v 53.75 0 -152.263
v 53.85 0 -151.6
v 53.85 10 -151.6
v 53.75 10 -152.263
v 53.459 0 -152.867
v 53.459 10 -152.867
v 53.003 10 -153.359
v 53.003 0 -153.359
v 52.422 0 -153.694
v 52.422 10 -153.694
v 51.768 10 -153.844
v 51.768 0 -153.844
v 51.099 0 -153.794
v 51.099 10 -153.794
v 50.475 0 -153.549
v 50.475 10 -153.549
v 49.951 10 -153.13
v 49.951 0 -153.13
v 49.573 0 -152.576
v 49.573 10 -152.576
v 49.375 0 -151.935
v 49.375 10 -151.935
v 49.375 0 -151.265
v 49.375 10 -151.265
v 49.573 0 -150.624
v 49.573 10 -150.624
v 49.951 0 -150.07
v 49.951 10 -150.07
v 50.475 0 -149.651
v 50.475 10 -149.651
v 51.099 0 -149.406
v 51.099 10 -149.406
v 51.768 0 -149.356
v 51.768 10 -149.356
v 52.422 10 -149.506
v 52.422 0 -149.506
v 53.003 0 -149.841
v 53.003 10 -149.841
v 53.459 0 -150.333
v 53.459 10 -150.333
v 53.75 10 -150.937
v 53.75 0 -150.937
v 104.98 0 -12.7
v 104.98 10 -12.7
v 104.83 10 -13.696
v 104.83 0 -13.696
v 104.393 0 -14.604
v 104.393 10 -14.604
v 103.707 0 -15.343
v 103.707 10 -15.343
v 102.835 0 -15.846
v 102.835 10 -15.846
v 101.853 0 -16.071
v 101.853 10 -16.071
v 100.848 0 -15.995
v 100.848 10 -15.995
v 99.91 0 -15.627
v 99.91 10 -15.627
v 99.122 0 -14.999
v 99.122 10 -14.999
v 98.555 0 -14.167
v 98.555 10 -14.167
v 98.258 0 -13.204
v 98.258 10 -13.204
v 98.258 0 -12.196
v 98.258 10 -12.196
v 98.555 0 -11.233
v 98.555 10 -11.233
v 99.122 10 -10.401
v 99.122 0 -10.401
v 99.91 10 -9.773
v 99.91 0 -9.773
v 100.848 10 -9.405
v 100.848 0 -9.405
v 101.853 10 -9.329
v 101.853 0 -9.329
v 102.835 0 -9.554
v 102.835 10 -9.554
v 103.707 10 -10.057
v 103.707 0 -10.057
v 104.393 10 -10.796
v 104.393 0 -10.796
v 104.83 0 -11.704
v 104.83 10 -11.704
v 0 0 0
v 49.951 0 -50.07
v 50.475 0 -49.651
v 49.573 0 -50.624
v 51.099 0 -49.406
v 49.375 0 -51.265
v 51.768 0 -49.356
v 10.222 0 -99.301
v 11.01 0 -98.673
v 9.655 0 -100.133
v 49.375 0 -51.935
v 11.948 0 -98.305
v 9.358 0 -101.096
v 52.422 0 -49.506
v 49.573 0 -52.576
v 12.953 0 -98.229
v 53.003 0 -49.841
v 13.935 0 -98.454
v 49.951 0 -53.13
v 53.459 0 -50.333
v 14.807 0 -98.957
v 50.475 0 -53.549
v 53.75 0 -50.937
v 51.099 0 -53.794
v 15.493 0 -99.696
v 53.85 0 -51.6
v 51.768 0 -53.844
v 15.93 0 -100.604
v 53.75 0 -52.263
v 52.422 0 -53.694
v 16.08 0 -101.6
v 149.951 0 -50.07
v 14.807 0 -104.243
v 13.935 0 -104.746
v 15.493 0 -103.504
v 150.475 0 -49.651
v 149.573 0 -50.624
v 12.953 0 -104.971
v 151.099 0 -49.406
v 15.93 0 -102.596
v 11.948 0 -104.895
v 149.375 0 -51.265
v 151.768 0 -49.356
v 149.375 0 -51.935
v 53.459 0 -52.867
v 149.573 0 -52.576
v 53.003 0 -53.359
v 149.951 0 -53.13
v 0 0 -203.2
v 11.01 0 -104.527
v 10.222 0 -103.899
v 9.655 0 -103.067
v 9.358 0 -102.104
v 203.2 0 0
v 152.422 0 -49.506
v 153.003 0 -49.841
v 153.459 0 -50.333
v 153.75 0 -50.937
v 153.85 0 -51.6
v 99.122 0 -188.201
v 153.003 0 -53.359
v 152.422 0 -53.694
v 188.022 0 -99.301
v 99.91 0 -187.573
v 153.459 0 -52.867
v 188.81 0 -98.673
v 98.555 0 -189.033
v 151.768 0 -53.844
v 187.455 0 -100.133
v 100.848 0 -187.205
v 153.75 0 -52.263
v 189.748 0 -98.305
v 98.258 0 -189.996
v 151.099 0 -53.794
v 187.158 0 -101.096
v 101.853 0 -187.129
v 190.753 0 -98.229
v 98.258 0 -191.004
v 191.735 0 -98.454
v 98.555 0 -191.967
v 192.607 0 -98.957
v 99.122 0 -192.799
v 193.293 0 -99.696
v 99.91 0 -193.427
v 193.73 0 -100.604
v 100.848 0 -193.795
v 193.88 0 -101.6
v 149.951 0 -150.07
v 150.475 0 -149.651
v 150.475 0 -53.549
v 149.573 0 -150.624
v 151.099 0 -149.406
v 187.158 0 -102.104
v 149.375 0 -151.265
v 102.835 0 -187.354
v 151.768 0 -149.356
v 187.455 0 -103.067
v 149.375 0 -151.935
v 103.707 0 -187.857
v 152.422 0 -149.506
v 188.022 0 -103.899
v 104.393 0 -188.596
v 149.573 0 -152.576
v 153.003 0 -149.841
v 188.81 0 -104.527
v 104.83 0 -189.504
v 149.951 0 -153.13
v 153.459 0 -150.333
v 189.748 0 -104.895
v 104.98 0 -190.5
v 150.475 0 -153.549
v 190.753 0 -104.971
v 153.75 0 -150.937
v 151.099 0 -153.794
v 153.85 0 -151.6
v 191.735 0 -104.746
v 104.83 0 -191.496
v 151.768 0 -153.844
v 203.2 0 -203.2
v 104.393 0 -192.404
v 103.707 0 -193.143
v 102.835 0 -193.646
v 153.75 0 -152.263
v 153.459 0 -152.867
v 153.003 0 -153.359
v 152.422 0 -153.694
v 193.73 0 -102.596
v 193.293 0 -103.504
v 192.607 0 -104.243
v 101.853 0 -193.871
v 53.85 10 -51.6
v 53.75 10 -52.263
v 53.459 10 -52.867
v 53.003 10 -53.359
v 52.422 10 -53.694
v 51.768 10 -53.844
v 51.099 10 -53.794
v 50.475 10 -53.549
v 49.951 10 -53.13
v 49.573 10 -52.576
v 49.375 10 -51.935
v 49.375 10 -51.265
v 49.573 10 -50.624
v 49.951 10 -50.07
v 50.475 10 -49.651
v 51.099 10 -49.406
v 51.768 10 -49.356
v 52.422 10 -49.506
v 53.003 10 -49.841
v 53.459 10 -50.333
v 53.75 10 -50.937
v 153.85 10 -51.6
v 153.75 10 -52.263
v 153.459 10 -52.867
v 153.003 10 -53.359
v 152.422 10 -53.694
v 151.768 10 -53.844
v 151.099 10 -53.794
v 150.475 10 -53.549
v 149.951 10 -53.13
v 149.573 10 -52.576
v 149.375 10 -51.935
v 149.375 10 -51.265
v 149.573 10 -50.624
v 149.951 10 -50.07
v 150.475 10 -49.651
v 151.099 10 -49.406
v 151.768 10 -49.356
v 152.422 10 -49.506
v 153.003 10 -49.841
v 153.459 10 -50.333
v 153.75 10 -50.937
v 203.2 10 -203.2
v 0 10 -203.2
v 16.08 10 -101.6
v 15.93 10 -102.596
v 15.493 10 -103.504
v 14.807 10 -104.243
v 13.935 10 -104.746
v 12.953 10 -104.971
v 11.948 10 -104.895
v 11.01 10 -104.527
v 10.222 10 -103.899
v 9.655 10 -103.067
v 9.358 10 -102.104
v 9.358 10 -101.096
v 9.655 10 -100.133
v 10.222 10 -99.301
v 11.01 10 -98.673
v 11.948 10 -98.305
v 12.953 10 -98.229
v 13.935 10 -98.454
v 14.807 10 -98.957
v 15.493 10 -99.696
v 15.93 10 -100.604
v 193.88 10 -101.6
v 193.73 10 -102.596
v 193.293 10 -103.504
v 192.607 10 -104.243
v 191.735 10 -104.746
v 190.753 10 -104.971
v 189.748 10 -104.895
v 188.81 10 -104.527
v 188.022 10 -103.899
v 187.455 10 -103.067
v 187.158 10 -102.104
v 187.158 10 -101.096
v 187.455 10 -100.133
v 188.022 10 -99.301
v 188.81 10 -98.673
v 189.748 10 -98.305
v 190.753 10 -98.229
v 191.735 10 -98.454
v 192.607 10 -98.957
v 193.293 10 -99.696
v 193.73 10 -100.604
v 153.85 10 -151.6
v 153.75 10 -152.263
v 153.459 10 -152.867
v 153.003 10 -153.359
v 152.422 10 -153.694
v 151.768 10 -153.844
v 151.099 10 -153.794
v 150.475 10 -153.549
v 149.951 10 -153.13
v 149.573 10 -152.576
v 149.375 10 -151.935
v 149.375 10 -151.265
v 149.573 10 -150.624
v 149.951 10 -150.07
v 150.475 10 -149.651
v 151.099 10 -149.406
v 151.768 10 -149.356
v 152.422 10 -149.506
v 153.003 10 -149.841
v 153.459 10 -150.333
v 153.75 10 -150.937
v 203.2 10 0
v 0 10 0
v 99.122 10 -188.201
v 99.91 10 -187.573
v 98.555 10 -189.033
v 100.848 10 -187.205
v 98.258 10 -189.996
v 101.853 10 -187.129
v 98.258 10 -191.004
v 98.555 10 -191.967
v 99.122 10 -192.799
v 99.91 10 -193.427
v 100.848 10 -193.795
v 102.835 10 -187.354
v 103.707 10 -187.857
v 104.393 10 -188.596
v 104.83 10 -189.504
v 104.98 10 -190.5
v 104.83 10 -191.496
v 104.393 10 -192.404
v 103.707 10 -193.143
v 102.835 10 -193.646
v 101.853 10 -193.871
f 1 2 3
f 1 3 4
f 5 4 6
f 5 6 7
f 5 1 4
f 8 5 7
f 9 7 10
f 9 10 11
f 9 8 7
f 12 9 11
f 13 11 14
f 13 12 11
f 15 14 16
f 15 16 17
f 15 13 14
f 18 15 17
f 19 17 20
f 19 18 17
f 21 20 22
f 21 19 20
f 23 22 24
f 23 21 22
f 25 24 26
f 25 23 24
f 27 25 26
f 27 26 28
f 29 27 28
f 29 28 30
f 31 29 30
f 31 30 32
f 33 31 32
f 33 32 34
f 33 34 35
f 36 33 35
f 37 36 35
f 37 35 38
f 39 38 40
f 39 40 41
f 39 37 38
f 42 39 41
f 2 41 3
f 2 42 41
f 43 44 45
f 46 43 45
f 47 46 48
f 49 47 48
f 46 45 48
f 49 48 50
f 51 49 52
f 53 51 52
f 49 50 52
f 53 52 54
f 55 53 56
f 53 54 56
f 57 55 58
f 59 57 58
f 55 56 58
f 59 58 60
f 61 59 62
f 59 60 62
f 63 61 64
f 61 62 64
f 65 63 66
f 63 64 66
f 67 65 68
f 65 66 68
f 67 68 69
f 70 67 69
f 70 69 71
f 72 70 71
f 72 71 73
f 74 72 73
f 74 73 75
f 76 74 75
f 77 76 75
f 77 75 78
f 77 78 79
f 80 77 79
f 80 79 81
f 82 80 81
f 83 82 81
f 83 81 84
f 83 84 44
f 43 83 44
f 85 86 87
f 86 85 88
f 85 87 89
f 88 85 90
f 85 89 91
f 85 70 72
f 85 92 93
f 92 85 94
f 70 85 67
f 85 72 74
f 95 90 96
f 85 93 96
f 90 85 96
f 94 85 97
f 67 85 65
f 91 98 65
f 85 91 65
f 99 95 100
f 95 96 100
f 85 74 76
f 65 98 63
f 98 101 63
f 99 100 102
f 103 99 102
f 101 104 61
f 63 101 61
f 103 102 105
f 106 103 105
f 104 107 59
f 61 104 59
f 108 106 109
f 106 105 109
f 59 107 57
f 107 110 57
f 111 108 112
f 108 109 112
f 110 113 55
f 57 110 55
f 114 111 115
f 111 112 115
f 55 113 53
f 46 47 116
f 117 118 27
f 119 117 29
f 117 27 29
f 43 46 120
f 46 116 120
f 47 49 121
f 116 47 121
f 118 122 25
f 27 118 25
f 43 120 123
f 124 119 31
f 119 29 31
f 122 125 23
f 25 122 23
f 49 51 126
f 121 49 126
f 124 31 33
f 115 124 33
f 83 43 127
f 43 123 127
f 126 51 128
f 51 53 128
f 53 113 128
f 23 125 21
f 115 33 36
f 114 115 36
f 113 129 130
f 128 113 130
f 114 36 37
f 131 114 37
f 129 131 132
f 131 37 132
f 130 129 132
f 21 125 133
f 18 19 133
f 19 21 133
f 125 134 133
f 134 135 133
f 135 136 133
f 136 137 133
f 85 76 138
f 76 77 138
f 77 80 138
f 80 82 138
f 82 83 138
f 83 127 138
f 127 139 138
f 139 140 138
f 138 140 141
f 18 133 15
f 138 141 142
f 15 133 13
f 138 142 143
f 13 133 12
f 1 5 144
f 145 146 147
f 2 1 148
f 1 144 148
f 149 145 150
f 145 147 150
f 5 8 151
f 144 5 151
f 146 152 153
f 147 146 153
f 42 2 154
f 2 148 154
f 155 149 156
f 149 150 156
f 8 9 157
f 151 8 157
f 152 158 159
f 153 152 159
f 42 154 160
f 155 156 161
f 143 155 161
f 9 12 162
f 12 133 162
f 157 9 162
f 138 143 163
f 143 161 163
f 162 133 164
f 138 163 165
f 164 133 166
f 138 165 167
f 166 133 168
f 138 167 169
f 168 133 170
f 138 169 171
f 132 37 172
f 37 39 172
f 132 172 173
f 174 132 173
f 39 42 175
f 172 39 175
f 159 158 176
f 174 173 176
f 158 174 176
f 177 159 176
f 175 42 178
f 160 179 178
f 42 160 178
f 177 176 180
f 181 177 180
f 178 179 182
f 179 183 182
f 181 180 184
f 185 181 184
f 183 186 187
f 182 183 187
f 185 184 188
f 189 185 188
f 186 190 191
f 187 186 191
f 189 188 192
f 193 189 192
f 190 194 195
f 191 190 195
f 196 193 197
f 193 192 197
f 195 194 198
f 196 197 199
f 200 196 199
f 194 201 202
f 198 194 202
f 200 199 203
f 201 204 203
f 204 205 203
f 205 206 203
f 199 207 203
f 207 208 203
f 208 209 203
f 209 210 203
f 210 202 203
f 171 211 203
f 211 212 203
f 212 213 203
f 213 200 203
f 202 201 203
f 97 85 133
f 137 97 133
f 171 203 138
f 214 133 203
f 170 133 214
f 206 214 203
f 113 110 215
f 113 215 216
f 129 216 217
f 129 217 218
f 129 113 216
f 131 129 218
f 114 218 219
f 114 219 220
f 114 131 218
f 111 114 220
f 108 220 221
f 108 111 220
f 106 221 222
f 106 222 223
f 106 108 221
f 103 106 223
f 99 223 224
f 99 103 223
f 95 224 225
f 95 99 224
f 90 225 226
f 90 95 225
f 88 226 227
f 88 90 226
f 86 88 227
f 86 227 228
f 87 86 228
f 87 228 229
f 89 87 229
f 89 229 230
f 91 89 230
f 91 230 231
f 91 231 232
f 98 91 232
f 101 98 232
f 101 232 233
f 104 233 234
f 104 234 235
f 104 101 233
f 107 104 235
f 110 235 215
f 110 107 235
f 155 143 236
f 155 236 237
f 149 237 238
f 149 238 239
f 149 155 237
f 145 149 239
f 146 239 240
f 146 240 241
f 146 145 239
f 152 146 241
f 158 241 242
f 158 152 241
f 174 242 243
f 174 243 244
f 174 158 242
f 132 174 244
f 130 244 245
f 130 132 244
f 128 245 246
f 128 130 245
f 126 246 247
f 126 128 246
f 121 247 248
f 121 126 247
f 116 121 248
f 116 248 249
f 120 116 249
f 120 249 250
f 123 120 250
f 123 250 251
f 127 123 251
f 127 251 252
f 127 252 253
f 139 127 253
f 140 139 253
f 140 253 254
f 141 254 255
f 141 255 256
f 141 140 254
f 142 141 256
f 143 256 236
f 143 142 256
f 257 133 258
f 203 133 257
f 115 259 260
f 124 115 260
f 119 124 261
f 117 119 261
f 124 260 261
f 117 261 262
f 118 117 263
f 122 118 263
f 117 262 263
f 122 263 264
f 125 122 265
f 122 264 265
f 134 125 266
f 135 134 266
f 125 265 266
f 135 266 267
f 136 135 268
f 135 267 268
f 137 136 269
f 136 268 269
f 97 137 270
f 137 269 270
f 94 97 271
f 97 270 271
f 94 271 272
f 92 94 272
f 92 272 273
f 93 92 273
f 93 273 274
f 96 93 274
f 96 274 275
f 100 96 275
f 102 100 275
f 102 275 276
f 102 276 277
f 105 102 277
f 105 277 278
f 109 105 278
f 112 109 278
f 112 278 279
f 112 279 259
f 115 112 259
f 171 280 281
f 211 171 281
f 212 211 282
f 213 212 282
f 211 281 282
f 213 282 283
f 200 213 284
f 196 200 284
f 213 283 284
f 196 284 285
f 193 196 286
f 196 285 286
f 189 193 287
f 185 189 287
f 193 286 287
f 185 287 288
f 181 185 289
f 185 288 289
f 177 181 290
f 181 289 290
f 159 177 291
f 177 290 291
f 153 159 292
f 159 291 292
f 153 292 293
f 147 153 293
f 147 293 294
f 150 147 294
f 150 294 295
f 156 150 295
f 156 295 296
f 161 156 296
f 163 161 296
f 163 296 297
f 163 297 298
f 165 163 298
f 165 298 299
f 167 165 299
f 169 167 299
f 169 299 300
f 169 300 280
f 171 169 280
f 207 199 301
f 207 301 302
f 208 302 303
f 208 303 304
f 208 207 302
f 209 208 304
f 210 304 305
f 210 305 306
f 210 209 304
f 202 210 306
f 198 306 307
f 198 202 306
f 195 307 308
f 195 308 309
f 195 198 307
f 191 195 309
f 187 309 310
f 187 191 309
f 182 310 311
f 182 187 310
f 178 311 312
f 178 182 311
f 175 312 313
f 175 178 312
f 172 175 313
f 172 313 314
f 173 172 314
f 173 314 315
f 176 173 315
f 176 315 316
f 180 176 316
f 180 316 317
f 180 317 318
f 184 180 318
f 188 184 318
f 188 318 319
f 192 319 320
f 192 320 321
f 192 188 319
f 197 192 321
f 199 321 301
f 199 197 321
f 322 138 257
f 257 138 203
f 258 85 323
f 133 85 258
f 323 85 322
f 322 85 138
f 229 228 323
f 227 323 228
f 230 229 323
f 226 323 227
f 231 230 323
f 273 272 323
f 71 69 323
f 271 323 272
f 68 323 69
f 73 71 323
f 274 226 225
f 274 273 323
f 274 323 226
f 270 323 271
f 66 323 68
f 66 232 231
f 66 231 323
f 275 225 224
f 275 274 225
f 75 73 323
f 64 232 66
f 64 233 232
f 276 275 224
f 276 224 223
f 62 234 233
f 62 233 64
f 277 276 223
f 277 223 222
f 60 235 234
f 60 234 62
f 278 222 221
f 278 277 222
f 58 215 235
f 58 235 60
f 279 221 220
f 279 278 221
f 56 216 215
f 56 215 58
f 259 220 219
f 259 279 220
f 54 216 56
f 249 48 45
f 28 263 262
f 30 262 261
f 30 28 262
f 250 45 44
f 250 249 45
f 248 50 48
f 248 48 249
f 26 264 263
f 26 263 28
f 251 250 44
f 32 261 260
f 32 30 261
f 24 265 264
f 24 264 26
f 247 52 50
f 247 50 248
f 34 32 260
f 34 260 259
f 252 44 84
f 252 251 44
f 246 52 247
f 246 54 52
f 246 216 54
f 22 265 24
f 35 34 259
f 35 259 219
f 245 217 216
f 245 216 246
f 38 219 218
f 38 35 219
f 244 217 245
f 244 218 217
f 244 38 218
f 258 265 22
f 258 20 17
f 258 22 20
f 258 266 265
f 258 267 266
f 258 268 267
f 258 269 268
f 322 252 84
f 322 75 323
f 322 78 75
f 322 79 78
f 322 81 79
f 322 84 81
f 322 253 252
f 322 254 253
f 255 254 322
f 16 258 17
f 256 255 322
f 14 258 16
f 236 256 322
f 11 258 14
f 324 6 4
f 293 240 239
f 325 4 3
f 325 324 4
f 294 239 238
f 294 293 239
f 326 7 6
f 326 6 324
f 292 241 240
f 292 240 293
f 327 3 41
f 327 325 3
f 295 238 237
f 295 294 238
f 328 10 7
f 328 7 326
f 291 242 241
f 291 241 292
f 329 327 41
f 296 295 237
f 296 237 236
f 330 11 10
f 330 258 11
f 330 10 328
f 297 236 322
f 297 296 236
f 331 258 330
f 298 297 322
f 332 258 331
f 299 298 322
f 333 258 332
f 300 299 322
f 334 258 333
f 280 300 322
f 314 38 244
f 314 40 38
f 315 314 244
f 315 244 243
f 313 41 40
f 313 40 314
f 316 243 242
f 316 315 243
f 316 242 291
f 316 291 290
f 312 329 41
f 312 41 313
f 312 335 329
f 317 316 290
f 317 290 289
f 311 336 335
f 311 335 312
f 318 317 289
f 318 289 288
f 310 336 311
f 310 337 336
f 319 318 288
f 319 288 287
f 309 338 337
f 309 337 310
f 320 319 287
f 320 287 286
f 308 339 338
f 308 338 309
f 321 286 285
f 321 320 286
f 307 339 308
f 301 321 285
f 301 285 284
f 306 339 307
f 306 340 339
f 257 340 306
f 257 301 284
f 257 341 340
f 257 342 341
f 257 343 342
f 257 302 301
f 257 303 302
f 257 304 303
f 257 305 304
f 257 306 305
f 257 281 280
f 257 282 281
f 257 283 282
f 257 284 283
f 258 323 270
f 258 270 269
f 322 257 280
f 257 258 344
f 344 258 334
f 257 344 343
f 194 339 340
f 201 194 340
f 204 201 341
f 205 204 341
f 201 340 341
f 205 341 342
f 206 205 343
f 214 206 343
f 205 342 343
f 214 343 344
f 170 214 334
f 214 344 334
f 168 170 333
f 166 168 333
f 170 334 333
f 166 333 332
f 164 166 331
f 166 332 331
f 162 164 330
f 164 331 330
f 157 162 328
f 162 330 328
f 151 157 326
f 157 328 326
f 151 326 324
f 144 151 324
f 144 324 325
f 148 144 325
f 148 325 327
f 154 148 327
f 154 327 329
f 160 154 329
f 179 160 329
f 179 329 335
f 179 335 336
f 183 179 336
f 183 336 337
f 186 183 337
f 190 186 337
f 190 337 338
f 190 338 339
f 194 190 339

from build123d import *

# Parameters (mm, degrees)
SKETCH1_W           = 203.2
SKETCH1_H           = 203.2
SKETCH1_W_2         = 115
SKETCH1_H_2         = 115
SKETCH1_R           = 2.25
BOSS_EXTRUDE1_DEPTH = 10
SKETCH4_R           = 3.38
CUT_EXTRUDE1_DEPTH  = 11


with BuildPart() as part:
    # Sketch1 → Boss-Extrude1 (new body)
    with BuildSketch(Plane(origin=(0, 0, 0), x_dir=(1, 0, 0), z_dir=(0, 1, 0))):
        with Locations((101.6, 101.6)):
            Rectangle(SKETCH1_W, SKETCH1_H)
        with Locations((101.6, 101.6)):
            Rectangle(SKETCH1_W_2, SKETCH1_H_2, mode=Mode.SUBTRACT)
        with Locations((101.6, 101.6)):
            Rectangle(SKETCH1_W_2, SKETCH1_H_2)
        with Locations((51.6, 151.6)):
            Circle(SKETCH1_R, mode=Mode.SUBTRACT)
        with Locations((151.6, 151.6)):
            Circle(SKETCH1_R, mode=Mode.SUBTRACT)
        with Locations((151.6, 51.6)):
            Circle(SKETCH1_R, mode=Mode.SUBTRACT)
        with Locations((51.6, 51.6)):
            Circle(SKETCH1_R, mode=Mode.SUBTRACT)
    extrude(amount=BOSS_EXTRUDE1_DEPTH)

    # Sketch4 → Cut-Extrude1 (cut, through all)
    with BuildSketch(Plane(origin=(0, 10, 0), x_dir=(1, 0, 0), z_dir=(0, 1, 0))):
        with Locations((12.7, 101.6)):
            Circle(SKETCH4_R)
        with Locations((190.5, 101.6)):
            Circle(SKETCH4_R)
        with Locations((101.6, 190.5)):
            Circle(SKETCH4_R)
        with Locations((101.6, 12.7)):
            Circle(SKETCH4_R)
    extrude(amount=-CUT_EXTRUDE1_DEPTH, mode=Mode.SUBTRACT)


solid = part.part
